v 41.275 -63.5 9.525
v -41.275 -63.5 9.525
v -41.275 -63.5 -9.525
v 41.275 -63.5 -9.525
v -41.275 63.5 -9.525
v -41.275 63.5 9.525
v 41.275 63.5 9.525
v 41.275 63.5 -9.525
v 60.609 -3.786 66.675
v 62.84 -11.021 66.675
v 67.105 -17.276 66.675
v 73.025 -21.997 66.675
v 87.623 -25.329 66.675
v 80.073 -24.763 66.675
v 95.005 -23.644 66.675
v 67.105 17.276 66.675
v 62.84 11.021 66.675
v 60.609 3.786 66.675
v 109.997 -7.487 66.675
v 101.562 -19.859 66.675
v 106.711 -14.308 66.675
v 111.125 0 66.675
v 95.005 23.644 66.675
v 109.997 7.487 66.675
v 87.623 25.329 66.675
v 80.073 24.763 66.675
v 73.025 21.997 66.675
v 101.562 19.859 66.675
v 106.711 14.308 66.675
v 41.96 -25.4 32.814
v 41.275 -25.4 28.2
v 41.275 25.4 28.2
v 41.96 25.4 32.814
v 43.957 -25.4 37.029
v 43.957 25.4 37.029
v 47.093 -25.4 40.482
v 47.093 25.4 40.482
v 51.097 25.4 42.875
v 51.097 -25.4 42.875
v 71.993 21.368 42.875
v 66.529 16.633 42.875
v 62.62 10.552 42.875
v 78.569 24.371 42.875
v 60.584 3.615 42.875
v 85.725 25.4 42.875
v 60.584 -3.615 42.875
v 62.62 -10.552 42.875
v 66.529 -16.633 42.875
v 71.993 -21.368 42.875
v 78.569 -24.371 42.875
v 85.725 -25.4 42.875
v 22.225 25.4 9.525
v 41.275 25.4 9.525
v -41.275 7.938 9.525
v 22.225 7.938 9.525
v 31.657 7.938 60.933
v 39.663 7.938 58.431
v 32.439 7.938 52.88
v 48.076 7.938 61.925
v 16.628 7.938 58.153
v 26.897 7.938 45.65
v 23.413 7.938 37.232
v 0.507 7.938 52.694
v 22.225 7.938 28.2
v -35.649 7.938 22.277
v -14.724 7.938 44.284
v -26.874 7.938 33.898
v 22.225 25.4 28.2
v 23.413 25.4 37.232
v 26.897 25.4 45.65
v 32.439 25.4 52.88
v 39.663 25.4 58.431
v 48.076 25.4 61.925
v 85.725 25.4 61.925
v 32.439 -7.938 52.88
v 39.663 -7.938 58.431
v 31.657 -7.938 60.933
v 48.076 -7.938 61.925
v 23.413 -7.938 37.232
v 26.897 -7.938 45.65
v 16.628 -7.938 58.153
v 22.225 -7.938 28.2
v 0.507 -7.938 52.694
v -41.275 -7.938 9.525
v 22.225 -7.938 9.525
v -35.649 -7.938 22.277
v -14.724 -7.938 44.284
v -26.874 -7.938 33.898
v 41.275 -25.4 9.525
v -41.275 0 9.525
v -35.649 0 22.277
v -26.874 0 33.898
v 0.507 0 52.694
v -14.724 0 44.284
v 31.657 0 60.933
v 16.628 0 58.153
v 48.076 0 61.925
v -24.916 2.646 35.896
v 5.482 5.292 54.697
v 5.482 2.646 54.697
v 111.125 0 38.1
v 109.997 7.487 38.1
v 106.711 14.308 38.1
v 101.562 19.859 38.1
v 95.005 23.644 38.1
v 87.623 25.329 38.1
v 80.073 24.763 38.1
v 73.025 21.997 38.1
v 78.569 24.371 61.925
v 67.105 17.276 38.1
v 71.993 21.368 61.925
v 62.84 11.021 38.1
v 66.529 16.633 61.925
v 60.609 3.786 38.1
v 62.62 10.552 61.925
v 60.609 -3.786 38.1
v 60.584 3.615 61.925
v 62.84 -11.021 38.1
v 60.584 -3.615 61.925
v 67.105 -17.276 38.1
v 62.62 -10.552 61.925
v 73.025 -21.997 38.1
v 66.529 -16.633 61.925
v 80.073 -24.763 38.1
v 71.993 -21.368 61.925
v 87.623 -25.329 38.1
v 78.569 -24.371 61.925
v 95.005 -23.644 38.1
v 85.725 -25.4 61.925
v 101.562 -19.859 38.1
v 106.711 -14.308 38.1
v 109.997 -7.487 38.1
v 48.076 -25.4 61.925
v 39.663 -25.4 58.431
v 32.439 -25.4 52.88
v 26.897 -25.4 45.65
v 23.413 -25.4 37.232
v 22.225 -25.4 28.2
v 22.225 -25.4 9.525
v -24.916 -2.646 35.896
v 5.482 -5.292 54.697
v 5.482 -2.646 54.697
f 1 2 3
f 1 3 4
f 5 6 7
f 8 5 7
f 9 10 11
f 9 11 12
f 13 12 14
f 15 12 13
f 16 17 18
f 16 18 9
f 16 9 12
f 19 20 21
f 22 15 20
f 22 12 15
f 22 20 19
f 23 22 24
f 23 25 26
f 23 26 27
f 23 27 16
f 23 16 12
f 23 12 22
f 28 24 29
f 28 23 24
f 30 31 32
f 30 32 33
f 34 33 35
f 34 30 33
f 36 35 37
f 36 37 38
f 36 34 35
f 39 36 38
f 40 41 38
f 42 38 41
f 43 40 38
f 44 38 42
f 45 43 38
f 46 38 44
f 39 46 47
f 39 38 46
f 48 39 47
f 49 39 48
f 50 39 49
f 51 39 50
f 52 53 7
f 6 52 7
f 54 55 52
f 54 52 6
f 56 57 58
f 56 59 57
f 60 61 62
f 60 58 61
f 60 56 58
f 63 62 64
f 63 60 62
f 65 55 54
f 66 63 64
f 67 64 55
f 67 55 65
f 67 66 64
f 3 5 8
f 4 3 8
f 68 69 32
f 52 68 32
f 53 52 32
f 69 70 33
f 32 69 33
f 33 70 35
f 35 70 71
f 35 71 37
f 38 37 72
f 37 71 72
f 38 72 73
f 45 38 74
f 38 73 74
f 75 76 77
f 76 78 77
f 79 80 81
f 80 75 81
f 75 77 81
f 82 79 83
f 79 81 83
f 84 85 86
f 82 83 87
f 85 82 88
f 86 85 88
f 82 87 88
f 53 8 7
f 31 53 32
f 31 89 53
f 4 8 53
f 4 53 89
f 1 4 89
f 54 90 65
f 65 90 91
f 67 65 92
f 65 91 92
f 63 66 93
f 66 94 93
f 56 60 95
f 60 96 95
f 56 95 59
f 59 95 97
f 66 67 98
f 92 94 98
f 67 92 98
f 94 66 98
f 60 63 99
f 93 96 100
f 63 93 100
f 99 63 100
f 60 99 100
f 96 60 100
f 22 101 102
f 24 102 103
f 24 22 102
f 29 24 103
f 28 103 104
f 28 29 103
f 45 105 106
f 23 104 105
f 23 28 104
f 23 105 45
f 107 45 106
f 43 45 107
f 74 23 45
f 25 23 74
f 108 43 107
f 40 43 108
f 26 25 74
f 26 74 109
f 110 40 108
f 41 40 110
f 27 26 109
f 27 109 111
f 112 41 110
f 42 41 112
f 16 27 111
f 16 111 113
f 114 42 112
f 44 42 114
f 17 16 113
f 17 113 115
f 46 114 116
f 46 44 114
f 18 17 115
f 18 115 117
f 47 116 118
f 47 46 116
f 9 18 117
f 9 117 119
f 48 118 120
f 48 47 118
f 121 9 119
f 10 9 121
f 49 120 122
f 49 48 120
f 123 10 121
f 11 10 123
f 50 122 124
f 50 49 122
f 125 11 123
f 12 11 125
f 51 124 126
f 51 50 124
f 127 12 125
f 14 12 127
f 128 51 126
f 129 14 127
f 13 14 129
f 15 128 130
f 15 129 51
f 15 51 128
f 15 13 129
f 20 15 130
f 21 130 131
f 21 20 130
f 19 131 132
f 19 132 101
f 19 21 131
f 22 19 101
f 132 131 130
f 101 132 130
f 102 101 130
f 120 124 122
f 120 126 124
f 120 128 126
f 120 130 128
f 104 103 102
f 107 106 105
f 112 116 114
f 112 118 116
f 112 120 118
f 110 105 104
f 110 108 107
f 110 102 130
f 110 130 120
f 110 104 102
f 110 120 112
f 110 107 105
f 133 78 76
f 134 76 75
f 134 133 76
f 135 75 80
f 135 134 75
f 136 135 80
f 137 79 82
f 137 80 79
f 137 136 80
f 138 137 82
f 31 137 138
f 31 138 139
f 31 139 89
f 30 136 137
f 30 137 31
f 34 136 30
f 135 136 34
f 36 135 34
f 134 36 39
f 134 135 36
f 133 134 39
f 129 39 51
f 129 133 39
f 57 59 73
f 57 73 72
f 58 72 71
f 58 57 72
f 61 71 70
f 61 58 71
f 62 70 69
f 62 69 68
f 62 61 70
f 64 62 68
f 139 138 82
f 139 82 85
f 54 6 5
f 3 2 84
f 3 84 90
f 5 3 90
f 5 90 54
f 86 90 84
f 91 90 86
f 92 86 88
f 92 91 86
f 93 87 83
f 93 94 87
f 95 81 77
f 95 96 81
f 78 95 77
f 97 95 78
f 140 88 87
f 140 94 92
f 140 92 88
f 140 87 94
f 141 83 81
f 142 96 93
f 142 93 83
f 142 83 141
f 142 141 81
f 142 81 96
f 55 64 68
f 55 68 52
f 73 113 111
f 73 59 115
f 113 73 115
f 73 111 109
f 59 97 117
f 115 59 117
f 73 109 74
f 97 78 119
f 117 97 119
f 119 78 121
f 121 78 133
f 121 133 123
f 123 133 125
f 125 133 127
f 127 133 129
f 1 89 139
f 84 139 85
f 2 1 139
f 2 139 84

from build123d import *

# Parameters (mm, degrees)
F1_DEPTH = 63.5
F2_DEPTH = 25.4
F0_W     = 25.4
F0_H     = 19.05
F3_DEPTH = 25.4
F4_DEPTH = 7.9375


with BuildPart() as f1:
    # F0 (on Front) → F1 (new body, symmetric)
    with BuildSketch(Plane.XZ):
        Polygon((22.225, 9.525), (-41.275, 9.525), (-41.275, -9.525), (41.275, -9.525), (41.275, 9.525), align=None)
    extrude(amount=F1_DEPTH, both=True)

    # F0 (on Front) → F2 (join, symmetric)
    with BuildSketch(Plane.XZ):
        with BuildLine():
            Line((22.225, 28.1995688956), (22.225, 9.525))
            Line((22.225, 9.525), (41.275, 9.525))
            Line((41.275, 9.525), (41.275, 28.1995688956))
            ThreePointArc((41.275, 28.1995688956), (43.9569999969, 37.0290862051), (51.0967796432, 42.8752))
            Line((51.0967796432, 42.8752), (60.325, 42.8752))
            Line((60.325, 42.8752), (60.325, 61.9252))
            Line((60.325, 61.9252), (48.076002446, 61.9252))
            ThreePointArc((48.076002446, 61.9252), (29.431188792, 49.4462893534), (22.225, 28.1995688956))
        make_face()
    extrude(amount=F2_DEPTH, both=True)

    # F0 (on Front) → F3 (join, symmetric)
    with BuildSketch(Plane.XZ):
        with Locations((73.025, 52.4002)):
            Rectangle(F0_W, F0_H)
    extrude(amount=F3_DEPTH, both=True)

    # F0 (on Front) → F4 (join, symmetric)
    with BuildSketch(Plane.XZ):
        with BuildLine():
            add(Edge.make_bspline(
                [(-41.275, 9.525), (-32.5510911644, 38.347762078), (0, 61.8160702288), (48.076002446, 61.9252)],
                knots=[0, 0, 0, 0, 103.5827331081, 103.5827331081, 103.5827331081, 103.5827331081], degree=3))
            Line((-41.275, 9.525), (22.225, 9.525))
            Line((22.225, 9.525), (22.225, 28.1995688956))
            ThreePointArc((22.225, 28.1995688956), (29.431188792, 49.4462893534), (48.076002446, 61.9252))
        make_face()
    extrude(amount=F4_DEPTH, both=True)

    # F0 (on Front) → F5 (revolve)
    with BuildSketch(Plane.XZ):
        Polygon((85.725, 66.675), (85.725, 61.9252), (85.725, 42.8752), (85.725, 38.1), (111.125, 38.1), (111.125, 66.675), align=None)
    revolve(axis=Axis((85.725, 0, 52.3875), (0, 0, 1)))


solid = f1.part
